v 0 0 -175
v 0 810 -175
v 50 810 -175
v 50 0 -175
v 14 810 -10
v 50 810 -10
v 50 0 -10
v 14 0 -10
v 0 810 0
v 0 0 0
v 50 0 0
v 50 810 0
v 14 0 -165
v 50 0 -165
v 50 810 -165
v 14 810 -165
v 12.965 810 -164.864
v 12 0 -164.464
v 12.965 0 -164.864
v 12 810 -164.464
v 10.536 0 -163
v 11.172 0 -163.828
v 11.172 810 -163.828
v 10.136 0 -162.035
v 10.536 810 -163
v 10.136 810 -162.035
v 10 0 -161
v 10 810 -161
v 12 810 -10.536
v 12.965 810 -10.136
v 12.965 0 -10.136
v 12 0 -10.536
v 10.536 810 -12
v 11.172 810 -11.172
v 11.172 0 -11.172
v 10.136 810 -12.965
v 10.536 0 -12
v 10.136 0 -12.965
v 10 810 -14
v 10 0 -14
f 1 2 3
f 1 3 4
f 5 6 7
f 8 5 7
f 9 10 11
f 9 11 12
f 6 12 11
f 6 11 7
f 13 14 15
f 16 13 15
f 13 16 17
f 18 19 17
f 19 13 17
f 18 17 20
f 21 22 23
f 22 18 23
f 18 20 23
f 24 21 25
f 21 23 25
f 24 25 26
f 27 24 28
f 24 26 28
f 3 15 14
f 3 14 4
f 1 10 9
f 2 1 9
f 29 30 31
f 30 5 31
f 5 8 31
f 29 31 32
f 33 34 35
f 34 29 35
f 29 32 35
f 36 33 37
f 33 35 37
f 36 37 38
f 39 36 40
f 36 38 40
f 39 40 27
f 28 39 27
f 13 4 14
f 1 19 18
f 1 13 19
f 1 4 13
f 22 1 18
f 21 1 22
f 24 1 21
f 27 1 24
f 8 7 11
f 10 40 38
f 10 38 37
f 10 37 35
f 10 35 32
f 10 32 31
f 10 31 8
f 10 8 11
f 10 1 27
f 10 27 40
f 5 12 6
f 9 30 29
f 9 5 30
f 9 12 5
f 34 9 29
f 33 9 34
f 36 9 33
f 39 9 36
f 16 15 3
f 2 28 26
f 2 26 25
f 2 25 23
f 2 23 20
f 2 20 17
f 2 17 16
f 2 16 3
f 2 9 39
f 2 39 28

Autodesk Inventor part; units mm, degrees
ref_plane "YZ Plane" through (0, 0, 0) normal (1, 0, 0) x (0, 1, 0)
ref_plane "XZ Plane" through (0, 0, 0) normal (0, 1, 0) x (-1, 0, 0)
ref_plane "XY Plane" through (0, 0, 0) normal (0, 0, 1) x (1, 0, 0)
sketch "Sketch1" plane through (0, 0, 0) normal (1, 0, 0) x (0, 1, 0)
  line L0 (0, 0) -> (810, 0)
  line L1 (810, 0) -> (810, -175)
  line L2 (810, -175) -> (0, -175)
  line L3 (0, -175) -> (0, 0)
extrude "Extrusion1" add sketch "Sketch1" along normal blind 10
sketch "Sketch2" plane through (10, 0, 0) normal (1, 0, 0) x (0, 0, -1)
  line L0 (0, 810) -> (0, 0) projected
  line L1 (175, 0) -> (175, 810) projected
  line L2 (0, 0) -> (175, 0)
  line L3 (175, 0) -> (175, 10)
  line L4 (175, 10) -> (0, 10)
  line L5 (0, 10) -> (0, 0)
  line L6 (175, 810) -> (0, 810) projected
  line L7 (0, 10) -> (10, 10)
  line L8 (10, 10) -> (10, 810)
  line L9 (10, 810) -> (0, 810)
  line L10 (0, 810) -> (0, 10)
  line L11 (10, 810) -> (175, 810)
  line L12 (175, 810) -> (175, 800)
  line L13 (175, 800) -> (10, 800)
  line L14 (10, 800) -> (10, 810)
  line L15 (175, 800) -> (165, 800)
  line L16 (165, 800) -> (165, 10)
  line L17 (165, 10) -> (175, 10)
  line L18 (175, 10) -> (175, 800)
  dimension "d4" = 10
  dimension "d5" = 10
  dimension "d6" = 10
  dimension "d7" = 10
extrude "Extrusion2" add sketch "Sketch2" along normal blind 40
sketch "Sketch3" plane through (50, 0, 0) normal (1, 0, 0) x (0, 0, -1)
  line L0 (175, 0) -> (0, 0) projected
  line L1 (0, 810) -> (175, 810) projected
  line L2 (10, 0) -> (165, 0)
  line L3 (165, 0) -> (165, 810)
  line L4 (165, 810) -> (10, 810)
  line L5 (10, 810) -> (10, 0)
  dimension "d10" = 155
extrude "Extrusion3" cut sketch "Sketch3" against normal blind 40
fillet "Fillet1" radius 4 1 edges at (10, 405, -165)
fillet "Fillet2" radius 4 1 edges at (10, 405, -10)
equation "\"BendRadius\" = Thickness"
equation "\"BendReliefWidth\" = Thickness"
equation "\"BendReliefDepth\" = 0.5 * Thickness"
equation "\"CornerReliefSize\" = 4 * Thickness"
equation "\"MinimumRemnant\" = 2 * Thickness"
equation "\"TransitionRadius\" = BendRadius"
equation "\"JacobiRadiusSize\" = BendRadius"
equation "\"GapSize\" = Thickness"
equation "\"Thickness\" = 0.5"
properties part number "Base1"
